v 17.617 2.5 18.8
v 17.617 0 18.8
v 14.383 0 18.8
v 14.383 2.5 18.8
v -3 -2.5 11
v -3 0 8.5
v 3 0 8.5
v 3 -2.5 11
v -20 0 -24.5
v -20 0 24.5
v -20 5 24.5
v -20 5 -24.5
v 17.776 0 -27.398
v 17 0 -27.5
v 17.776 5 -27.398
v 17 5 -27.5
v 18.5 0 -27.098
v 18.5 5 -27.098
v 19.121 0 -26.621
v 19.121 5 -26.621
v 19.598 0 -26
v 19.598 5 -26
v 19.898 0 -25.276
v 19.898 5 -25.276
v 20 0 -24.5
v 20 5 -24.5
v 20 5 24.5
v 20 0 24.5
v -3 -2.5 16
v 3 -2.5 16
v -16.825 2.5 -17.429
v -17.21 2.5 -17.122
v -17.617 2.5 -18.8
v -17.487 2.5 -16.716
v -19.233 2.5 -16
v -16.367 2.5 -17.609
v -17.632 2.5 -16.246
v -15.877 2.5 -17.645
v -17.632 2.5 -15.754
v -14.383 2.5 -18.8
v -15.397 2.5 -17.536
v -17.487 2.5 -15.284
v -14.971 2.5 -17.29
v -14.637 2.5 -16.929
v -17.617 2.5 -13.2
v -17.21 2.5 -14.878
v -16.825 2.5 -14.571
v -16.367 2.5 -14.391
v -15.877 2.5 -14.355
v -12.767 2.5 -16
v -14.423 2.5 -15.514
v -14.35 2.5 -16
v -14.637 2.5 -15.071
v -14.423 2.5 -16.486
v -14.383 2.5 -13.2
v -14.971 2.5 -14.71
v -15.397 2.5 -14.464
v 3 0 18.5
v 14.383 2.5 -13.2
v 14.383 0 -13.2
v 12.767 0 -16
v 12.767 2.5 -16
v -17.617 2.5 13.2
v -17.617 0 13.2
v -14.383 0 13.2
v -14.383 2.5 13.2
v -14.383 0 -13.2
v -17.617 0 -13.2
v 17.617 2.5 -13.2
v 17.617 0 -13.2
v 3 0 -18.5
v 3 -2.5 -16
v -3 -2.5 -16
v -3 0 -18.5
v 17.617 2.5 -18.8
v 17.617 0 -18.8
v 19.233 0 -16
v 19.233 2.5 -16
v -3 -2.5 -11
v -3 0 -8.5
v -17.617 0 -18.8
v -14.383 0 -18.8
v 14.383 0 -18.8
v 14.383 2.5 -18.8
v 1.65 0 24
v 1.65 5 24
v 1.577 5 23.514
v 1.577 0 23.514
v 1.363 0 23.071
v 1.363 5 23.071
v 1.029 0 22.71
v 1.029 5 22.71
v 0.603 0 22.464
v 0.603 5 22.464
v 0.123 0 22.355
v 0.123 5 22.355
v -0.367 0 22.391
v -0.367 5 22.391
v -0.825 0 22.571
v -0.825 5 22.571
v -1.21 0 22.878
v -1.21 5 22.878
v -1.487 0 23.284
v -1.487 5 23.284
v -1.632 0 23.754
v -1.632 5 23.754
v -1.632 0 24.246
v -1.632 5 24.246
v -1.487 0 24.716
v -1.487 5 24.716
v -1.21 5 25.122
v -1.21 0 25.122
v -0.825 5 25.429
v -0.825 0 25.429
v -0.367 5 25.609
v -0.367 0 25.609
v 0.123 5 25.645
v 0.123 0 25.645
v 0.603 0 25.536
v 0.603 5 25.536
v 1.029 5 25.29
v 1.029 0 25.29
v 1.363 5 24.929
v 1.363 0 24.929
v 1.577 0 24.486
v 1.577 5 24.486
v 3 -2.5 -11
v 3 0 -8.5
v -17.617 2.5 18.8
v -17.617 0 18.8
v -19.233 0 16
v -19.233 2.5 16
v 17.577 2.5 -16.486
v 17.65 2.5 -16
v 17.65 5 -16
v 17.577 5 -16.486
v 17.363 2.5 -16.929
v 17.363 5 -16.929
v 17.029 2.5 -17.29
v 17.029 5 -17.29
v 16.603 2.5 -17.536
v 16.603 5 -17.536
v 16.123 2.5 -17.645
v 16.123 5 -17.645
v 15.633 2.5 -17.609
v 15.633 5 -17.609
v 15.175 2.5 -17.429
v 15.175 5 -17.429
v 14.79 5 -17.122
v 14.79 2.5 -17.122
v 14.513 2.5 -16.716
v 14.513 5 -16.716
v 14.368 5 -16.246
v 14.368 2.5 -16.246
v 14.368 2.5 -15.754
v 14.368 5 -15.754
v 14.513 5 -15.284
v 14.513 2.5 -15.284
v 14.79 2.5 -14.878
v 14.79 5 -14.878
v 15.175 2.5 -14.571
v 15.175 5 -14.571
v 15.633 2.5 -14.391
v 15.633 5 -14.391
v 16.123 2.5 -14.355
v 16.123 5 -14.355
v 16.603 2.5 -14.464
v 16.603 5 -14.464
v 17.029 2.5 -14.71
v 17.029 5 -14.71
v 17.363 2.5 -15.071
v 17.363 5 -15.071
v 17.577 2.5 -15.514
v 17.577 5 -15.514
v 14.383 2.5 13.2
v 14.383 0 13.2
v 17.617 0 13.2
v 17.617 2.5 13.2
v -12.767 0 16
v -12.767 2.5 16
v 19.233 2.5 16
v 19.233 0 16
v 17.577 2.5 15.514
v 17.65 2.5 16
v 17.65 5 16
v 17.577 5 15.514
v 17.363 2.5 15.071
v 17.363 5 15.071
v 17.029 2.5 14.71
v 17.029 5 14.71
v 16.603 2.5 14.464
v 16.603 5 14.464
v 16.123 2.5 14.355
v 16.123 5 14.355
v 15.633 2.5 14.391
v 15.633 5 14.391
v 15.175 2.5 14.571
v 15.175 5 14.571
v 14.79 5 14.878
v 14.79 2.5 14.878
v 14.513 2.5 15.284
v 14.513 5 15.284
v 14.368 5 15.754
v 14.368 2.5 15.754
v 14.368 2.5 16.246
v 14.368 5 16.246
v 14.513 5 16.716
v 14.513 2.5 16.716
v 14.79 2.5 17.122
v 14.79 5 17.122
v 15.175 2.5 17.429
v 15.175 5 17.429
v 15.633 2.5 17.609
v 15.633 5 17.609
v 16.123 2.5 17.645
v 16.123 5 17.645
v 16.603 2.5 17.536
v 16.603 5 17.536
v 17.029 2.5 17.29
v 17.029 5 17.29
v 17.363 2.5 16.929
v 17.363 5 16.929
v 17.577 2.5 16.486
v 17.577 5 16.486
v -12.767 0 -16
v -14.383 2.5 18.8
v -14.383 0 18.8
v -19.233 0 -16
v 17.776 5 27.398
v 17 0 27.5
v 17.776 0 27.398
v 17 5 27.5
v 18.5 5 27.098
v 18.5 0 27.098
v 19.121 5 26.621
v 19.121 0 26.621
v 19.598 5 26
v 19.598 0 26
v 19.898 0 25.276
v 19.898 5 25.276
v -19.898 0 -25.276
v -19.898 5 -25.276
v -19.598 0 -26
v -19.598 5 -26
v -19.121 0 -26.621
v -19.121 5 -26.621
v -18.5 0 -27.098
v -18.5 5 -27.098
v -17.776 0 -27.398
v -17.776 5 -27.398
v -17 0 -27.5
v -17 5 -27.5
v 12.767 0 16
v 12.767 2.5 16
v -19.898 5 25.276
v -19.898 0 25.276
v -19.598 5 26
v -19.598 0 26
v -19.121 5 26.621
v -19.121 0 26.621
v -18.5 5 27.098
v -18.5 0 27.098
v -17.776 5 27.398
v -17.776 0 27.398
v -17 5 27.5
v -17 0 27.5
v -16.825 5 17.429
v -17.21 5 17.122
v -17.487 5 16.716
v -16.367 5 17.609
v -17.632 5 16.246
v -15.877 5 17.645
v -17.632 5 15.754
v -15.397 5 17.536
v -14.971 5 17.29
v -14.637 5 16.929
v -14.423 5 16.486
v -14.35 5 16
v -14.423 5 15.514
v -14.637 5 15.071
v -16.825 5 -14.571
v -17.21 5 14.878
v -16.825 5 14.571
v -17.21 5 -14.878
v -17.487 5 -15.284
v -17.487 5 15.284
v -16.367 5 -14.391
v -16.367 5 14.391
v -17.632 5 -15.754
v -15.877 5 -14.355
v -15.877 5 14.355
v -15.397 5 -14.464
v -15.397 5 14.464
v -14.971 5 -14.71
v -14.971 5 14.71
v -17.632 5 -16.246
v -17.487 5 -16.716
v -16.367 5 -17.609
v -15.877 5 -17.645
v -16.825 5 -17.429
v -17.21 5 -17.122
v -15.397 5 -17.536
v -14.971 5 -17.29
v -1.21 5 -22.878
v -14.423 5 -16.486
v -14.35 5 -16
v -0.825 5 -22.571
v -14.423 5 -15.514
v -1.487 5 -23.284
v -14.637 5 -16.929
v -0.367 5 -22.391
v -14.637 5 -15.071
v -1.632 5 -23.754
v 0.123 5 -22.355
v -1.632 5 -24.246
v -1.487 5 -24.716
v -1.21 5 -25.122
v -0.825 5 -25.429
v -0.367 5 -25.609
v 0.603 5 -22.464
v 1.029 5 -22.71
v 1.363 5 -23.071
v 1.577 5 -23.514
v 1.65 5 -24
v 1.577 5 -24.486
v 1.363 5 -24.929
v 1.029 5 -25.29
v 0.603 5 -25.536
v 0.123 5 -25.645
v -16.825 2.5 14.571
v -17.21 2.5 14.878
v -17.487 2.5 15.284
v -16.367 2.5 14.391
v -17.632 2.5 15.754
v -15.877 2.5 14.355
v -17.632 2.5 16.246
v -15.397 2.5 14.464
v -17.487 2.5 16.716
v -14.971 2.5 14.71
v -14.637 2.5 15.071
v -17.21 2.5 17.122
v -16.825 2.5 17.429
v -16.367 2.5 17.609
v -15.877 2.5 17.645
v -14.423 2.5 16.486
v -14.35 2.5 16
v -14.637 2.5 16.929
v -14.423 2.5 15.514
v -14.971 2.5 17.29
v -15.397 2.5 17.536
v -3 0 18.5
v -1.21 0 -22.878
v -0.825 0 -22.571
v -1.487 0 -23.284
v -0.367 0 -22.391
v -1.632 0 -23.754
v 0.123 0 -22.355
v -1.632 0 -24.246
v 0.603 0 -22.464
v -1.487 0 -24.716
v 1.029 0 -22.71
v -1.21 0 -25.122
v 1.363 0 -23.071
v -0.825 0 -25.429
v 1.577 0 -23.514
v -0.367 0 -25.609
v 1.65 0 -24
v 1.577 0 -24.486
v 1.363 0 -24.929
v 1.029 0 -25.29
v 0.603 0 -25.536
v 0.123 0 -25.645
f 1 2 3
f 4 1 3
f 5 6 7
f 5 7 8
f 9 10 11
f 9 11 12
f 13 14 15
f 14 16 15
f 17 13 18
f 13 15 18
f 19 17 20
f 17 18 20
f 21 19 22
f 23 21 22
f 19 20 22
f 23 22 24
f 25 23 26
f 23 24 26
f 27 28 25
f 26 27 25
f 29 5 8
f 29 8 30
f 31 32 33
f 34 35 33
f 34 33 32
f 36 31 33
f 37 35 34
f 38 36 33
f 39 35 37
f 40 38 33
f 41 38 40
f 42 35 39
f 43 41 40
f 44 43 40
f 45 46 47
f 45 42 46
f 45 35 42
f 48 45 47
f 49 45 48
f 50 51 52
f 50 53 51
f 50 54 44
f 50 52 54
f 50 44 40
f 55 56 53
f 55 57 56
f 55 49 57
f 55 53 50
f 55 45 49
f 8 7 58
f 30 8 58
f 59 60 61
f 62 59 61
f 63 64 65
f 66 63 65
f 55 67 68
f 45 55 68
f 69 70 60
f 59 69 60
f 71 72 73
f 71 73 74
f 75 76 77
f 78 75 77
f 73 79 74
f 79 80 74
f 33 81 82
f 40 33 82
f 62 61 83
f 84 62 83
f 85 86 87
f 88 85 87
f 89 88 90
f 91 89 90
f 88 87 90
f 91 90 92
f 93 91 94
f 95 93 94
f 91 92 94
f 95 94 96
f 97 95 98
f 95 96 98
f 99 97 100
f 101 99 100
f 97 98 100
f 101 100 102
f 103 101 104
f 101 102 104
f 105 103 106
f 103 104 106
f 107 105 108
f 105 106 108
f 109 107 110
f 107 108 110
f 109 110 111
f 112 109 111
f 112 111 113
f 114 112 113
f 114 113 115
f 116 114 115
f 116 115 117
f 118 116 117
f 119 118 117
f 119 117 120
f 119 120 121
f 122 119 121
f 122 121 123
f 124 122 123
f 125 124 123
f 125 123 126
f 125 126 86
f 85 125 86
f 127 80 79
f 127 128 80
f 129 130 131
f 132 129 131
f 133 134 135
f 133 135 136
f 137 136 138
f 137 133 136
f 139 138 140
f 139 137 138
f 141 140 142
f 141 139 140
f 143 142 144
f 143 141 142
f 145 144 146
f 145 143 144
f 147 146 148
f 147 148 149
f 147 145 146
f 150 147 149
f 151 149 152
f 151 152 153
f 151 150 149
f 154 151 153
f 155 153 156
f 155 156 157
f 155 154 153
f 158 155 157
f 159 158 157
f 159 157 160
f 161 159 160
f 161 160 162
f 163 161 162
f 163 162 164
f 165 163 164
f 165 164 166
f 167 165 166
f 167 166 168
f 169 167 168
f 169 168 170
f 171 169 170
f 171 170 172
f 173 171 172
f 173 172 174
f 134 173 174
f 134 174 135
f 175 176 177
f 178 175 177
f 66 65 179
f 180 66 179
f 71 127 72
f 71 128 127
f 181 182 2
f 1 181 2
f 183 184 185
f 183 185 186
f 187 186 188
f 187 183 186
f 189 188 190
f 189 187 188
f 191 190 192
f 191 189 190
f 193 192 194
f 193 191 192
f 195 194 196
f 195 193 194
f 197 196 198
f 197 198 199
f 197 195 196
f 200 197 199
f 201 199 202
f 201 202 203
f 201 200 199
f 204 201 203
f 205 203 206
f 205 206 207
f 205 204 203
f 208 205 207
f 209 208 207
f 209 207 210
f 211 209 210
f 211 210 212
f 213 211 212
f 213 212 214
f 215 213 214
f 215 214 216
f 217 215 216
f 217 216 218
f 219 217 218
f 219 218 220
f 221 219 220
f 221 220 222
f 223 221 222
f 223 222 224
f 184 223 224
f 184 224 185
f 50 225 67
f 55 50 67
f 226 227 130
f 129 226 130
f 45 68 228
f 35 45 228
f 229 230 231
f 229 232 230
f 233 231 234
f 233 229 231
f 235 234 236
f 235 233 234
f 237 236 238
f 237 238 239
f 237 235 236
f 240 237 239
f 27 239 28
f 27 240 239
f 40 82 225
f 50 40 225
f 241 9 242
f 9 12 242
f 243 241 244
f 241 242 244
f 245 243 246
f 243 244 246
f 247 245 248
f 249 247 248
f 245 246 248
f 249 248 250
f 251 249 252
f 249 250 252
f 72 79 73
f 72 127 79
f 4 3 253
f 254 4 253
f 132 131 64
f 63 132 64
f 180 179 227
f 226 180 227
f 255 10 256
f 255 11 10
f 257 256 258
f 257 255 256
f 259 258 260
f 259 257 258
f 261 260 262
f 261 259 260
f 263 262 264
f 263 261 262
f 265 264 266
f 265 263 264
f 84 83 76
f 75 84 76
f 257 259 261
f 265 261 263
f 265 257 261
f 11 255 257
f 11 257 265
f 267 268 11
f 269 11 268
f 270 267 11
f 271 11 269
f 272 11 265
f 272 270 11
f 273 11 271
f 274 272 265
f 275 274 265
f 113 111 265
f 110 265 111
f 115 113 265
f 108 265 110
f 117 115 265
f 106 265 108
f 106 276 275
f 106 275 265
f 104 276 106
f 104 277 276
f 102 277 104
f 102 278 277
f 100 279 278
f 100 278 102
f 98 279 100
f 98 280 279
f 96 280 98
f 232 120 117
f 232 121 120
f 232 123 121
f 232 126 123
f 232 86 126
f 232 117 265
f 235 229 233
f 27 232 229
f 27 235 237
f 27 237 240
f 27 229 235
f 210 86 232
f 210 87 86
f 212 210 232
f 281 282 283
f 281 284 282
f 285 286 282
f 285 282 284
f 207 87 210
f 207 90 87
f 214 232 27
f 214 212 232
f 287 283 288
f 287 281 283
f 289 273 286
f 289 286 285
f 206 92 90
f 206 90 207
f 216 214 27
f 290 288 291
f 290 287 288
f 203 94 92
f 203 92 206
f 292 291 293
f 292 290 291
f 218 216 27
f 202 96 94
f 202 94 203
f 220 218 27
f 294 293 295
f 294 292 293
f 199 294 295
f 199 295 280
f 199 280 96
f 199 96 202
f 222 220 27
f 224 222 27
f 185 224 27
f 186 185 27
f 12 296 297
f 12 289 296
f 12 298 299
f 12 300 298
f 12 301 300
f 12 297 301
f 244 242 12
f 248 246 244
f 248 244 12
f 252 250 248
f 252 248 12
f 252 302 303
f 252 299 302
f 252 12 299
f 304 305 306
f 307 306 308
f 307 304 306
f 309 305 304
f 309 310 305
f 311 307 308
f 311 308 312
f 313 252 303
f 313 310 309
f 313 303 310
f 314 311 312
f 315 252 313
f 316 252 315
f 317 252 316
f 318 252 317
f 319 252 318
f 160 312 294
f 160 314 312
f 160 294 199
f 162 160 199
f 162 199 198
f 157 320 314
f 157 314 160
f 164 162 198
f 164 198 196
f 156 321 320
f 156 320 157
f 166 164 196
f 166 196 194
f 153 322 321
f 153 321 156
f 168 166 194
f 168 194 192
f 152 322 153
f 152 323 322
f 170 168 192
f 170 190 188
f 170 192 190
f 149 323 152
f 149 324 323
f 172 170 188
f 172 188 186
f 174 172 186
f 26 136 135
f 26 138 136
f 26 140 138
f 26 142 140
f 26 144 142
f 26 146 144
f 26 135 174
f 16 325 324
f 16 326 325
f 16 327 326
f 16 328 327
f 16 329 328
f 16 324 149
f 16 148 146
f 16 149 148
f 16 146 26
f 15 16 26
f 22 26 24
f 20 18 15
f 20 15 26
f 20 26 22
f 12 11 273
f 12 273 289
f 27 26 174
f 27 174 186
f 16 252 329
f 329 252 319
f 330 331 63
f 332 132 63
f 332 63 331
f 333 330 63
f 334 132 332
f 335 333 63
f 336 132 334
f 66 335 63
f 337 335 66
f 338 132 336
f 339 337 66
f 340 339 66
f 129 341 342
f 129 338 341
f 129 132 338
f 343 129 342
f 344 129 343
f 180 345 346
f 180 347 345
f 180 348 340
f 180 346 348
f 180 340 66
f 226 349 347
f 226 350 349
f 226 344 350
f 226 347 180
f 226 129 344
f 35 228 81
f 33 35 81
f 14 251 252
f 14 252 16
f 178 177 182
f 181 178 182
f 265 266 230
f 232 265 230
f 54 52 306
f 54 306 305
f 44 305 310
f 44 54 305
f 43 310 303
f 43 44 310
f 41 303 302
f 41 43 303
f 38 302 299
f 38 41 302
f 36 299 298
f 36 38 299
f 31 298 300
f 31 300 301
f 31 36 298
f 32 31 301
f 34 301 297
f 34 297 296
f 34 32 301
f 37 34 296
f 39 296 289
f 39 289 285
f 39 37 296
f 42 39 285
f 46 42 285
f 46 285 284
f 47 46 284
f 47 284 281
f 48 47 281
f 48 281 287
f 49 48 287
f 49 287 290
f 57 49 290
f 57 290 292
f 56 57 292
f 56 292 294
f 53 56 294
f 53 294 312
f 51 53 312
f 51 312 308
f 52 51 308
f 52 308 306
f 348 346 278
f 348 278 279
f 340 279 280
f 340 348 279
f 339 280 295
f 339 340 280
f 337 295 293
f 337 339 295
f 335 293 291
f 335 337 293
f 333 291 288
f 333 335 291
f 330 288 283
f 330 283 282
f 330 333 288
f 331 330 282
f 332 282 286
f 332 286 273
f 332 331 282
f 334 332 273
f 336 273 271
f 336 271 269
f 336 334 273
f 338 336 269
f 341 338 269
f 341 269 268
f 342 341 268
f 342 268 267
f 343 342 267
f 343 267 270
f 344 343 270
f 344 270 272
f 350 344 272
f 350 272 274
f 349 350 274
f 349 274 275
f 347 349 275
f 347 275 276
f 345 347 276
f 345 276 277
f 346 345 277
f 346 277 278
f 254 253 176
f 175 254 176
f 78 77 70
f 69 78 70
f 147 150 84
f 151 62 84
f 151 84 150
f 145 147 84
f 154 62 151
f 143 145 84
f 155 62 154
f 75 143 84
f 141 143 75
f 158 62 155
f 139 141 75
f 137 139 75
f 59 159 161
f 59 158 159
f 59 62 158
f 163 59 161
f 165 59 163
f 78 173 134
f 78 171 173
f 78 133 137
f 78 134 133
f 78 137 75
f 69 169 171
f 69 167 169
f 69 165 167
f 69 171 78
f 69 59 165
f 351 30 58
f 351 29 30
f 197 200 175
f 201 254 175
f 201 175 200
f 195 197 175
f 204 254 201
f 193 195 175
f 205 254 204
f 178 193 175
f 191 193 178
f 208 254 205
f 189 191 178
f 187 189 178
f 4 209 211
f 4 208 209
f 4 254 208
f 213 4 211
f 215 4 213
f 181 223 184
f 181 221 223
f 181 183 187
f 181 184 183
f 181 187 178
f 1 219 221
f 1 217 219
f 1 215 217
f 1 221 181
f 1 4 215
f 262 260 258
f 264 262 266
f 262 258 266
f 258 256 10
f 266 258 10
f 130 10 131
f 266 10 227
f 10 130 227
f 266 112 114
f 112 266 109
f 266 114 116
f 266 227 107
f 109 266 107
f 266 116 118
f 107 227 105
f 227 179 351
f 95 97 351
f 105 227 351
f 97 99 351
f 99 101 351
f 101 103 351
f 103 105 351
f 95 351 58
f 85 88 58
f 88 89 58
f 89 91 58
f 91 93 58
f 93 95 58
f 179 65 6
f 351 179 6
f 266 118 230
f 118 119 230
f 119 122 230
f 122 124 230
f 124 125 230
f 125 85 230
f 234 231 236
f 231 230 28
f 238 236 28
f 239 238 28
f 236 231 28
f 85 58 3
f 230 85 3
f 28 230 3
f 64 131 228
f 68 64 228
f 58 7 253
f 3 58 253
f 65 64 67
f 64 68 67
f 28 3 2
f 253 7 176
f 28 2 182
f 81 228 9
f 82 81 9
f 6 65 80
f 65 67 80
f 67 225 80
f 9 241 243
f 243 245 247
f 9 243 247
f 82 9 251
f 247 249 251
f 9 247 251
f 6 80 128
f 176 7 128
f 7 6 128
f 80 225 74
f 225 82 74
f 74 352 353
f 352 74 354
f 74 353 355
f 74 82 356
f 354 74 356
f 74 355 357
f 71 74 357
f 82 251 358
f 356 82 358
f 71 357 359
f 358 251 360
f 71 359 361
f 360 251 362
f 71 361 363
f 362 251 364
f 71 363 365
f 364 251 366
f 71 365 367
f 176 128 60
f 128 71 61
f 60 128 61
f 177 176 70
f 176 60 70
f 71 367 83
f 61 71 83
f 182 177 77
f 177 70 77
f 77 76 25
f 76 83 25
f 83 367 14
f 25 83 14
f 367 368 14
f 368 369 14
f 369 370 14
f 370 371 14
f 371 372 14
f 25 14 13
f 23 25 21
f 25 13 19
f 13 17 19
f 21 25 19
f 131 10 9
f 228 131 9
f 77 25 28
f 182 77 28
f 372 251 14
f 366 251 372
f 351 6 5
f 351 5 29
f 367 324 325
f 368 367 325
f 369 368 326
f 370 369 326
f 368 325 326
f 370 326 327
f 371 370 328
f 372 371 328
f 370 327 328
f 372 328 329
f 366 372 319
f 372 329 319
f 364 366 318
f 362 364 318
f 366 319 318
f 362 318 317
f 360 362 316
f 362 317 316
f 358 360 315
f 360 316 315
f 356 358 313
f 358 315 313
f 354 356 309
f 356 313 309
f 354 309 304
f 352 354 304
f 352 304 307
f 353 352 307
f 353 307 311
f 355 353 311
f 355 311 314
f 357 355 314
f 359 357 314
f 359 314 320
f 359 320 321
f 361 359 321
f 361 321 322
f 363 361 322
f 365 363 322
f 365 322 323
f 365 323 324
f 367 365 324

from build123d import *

# Parameters (mm, degrees)
SKETCH_1_W          = 40
SKETCH_1_H          = 55
SKETCH_1_R          = 1.65
EXTRUDE_1_DEPTH     = 5
EXTRUDE_2_DEPTH     = 3
SKETCH_3_R          = 1.65
CUT_EXTRUDE_1_DEPTH = 8.5
CUT_EXTRUDE_2_DEPTH = 2.5
FILLET_1_R          = 3


with BuildPart() as part:
    # 草图1 → 凸台-拉伸1 (new body)
    with BuildSketch(Plane(origin=(0, 0, 0), x_dir=(1, 0, 0), z_dir=(0, 1, 0))):
        Rectangle(SKETCH_1_W, SKETCH_1_H)
        with Locations((-16, 16)):
            Circle(SKETCH_1_R, mode=Mode.SUBTRACT)
        with Locations((16, 16)):
            Circle(SKETCH_1_R, mode=Mode.SUBTRACT)
        with Locations((16, -16)):
            Circle(SKETCH_1_R, mode=Mode.SUBTRACT)
        with Locations((-16, -16)):
            Circle(SKETCH_1_R, mode=Mode.SUBTRACT)
    extrude(amount=EXTRUDE_1_DEPTH)

    # 草图2 → 凸台-拉伸2 (add, symmetric)
    with BuildSketch(Plane(origin=(0, 0, 0), x_dir=(0, 0, -1), z_dir=(1, 0, 0))):
        Polygon((-18.5, 0), (-8.5, 0), (-11, -2.5), (-16, -2.5), align=None)
        Polygon((11, -2.5), (16, -2.5), (18.5, 0), (8.5, 0), align=None)
    extrude(amount=EXTRUDE_2_DEPTH, both=True)

    # 草图3 → 切除-拉伸1 (cut, through all)
    with BuildSketch(Plane(origin=(0, 5, 0), x_dir=(1, 0, 0), z_dir=(0, 1, 0))):
        with Locations((0, -24)):
            Circle(SKETCH_3_R)
        with Locations((0, 24)):
            Circle(SKETCH_3_R)
    extrude(amount=-CUT_EXTRUDE_1_DEPTH, mode=Mode.SUBTRACT)

    # 草图4 → 切除-拉伸2 (cut)
    with BuildSketch(Plane.XZ):
        Polygon((-14.383419246, 18.8), (-17.616580754, 18.8), (-19.233161507, 16), (-17.616580754, 13.2), (-14.383419246, 13.2), (-12.766838493, 16), align=None)
        Polygon((17.616580754, 18.8), (14.383419246, 18.8), (12.766838493, 16), (14.383419246, 13.2), (17.616580754, 13.2), (19.233161507, 16), align=None)
        Polygon((14.383419246, -13.2), (12.766838493, -16), (14.383419246, -18.8), (17.616580754, -18.8), (19.233161507, -16), (17.616580754, -13.2), align=None)
        Polygon((-17.616580754, -13.2), (-19.233161507, -16), (-17.616580754, -18.8), (-14.383419246, -18.8), (-12.766838493, -16), (-14.383419246, -13.2), align=None)
    extrude(amount=-CUT_EXTRUDE_2_DEPTH, mode=Mode.SUBTRACT)

    # 圆角1
    fillet_1_edges = [part.edges().sort_by_distance(p)[0] for p in [
        (20, 2.5, 27.5),
        (-20, 2.5, 27.5),
        (-20, 2.5, -27.5),
        (20, 2.5, -27.5),
    ]]
    fillet(fillet_1_edges, radius=FILLET_1_R)


solid = part.part
